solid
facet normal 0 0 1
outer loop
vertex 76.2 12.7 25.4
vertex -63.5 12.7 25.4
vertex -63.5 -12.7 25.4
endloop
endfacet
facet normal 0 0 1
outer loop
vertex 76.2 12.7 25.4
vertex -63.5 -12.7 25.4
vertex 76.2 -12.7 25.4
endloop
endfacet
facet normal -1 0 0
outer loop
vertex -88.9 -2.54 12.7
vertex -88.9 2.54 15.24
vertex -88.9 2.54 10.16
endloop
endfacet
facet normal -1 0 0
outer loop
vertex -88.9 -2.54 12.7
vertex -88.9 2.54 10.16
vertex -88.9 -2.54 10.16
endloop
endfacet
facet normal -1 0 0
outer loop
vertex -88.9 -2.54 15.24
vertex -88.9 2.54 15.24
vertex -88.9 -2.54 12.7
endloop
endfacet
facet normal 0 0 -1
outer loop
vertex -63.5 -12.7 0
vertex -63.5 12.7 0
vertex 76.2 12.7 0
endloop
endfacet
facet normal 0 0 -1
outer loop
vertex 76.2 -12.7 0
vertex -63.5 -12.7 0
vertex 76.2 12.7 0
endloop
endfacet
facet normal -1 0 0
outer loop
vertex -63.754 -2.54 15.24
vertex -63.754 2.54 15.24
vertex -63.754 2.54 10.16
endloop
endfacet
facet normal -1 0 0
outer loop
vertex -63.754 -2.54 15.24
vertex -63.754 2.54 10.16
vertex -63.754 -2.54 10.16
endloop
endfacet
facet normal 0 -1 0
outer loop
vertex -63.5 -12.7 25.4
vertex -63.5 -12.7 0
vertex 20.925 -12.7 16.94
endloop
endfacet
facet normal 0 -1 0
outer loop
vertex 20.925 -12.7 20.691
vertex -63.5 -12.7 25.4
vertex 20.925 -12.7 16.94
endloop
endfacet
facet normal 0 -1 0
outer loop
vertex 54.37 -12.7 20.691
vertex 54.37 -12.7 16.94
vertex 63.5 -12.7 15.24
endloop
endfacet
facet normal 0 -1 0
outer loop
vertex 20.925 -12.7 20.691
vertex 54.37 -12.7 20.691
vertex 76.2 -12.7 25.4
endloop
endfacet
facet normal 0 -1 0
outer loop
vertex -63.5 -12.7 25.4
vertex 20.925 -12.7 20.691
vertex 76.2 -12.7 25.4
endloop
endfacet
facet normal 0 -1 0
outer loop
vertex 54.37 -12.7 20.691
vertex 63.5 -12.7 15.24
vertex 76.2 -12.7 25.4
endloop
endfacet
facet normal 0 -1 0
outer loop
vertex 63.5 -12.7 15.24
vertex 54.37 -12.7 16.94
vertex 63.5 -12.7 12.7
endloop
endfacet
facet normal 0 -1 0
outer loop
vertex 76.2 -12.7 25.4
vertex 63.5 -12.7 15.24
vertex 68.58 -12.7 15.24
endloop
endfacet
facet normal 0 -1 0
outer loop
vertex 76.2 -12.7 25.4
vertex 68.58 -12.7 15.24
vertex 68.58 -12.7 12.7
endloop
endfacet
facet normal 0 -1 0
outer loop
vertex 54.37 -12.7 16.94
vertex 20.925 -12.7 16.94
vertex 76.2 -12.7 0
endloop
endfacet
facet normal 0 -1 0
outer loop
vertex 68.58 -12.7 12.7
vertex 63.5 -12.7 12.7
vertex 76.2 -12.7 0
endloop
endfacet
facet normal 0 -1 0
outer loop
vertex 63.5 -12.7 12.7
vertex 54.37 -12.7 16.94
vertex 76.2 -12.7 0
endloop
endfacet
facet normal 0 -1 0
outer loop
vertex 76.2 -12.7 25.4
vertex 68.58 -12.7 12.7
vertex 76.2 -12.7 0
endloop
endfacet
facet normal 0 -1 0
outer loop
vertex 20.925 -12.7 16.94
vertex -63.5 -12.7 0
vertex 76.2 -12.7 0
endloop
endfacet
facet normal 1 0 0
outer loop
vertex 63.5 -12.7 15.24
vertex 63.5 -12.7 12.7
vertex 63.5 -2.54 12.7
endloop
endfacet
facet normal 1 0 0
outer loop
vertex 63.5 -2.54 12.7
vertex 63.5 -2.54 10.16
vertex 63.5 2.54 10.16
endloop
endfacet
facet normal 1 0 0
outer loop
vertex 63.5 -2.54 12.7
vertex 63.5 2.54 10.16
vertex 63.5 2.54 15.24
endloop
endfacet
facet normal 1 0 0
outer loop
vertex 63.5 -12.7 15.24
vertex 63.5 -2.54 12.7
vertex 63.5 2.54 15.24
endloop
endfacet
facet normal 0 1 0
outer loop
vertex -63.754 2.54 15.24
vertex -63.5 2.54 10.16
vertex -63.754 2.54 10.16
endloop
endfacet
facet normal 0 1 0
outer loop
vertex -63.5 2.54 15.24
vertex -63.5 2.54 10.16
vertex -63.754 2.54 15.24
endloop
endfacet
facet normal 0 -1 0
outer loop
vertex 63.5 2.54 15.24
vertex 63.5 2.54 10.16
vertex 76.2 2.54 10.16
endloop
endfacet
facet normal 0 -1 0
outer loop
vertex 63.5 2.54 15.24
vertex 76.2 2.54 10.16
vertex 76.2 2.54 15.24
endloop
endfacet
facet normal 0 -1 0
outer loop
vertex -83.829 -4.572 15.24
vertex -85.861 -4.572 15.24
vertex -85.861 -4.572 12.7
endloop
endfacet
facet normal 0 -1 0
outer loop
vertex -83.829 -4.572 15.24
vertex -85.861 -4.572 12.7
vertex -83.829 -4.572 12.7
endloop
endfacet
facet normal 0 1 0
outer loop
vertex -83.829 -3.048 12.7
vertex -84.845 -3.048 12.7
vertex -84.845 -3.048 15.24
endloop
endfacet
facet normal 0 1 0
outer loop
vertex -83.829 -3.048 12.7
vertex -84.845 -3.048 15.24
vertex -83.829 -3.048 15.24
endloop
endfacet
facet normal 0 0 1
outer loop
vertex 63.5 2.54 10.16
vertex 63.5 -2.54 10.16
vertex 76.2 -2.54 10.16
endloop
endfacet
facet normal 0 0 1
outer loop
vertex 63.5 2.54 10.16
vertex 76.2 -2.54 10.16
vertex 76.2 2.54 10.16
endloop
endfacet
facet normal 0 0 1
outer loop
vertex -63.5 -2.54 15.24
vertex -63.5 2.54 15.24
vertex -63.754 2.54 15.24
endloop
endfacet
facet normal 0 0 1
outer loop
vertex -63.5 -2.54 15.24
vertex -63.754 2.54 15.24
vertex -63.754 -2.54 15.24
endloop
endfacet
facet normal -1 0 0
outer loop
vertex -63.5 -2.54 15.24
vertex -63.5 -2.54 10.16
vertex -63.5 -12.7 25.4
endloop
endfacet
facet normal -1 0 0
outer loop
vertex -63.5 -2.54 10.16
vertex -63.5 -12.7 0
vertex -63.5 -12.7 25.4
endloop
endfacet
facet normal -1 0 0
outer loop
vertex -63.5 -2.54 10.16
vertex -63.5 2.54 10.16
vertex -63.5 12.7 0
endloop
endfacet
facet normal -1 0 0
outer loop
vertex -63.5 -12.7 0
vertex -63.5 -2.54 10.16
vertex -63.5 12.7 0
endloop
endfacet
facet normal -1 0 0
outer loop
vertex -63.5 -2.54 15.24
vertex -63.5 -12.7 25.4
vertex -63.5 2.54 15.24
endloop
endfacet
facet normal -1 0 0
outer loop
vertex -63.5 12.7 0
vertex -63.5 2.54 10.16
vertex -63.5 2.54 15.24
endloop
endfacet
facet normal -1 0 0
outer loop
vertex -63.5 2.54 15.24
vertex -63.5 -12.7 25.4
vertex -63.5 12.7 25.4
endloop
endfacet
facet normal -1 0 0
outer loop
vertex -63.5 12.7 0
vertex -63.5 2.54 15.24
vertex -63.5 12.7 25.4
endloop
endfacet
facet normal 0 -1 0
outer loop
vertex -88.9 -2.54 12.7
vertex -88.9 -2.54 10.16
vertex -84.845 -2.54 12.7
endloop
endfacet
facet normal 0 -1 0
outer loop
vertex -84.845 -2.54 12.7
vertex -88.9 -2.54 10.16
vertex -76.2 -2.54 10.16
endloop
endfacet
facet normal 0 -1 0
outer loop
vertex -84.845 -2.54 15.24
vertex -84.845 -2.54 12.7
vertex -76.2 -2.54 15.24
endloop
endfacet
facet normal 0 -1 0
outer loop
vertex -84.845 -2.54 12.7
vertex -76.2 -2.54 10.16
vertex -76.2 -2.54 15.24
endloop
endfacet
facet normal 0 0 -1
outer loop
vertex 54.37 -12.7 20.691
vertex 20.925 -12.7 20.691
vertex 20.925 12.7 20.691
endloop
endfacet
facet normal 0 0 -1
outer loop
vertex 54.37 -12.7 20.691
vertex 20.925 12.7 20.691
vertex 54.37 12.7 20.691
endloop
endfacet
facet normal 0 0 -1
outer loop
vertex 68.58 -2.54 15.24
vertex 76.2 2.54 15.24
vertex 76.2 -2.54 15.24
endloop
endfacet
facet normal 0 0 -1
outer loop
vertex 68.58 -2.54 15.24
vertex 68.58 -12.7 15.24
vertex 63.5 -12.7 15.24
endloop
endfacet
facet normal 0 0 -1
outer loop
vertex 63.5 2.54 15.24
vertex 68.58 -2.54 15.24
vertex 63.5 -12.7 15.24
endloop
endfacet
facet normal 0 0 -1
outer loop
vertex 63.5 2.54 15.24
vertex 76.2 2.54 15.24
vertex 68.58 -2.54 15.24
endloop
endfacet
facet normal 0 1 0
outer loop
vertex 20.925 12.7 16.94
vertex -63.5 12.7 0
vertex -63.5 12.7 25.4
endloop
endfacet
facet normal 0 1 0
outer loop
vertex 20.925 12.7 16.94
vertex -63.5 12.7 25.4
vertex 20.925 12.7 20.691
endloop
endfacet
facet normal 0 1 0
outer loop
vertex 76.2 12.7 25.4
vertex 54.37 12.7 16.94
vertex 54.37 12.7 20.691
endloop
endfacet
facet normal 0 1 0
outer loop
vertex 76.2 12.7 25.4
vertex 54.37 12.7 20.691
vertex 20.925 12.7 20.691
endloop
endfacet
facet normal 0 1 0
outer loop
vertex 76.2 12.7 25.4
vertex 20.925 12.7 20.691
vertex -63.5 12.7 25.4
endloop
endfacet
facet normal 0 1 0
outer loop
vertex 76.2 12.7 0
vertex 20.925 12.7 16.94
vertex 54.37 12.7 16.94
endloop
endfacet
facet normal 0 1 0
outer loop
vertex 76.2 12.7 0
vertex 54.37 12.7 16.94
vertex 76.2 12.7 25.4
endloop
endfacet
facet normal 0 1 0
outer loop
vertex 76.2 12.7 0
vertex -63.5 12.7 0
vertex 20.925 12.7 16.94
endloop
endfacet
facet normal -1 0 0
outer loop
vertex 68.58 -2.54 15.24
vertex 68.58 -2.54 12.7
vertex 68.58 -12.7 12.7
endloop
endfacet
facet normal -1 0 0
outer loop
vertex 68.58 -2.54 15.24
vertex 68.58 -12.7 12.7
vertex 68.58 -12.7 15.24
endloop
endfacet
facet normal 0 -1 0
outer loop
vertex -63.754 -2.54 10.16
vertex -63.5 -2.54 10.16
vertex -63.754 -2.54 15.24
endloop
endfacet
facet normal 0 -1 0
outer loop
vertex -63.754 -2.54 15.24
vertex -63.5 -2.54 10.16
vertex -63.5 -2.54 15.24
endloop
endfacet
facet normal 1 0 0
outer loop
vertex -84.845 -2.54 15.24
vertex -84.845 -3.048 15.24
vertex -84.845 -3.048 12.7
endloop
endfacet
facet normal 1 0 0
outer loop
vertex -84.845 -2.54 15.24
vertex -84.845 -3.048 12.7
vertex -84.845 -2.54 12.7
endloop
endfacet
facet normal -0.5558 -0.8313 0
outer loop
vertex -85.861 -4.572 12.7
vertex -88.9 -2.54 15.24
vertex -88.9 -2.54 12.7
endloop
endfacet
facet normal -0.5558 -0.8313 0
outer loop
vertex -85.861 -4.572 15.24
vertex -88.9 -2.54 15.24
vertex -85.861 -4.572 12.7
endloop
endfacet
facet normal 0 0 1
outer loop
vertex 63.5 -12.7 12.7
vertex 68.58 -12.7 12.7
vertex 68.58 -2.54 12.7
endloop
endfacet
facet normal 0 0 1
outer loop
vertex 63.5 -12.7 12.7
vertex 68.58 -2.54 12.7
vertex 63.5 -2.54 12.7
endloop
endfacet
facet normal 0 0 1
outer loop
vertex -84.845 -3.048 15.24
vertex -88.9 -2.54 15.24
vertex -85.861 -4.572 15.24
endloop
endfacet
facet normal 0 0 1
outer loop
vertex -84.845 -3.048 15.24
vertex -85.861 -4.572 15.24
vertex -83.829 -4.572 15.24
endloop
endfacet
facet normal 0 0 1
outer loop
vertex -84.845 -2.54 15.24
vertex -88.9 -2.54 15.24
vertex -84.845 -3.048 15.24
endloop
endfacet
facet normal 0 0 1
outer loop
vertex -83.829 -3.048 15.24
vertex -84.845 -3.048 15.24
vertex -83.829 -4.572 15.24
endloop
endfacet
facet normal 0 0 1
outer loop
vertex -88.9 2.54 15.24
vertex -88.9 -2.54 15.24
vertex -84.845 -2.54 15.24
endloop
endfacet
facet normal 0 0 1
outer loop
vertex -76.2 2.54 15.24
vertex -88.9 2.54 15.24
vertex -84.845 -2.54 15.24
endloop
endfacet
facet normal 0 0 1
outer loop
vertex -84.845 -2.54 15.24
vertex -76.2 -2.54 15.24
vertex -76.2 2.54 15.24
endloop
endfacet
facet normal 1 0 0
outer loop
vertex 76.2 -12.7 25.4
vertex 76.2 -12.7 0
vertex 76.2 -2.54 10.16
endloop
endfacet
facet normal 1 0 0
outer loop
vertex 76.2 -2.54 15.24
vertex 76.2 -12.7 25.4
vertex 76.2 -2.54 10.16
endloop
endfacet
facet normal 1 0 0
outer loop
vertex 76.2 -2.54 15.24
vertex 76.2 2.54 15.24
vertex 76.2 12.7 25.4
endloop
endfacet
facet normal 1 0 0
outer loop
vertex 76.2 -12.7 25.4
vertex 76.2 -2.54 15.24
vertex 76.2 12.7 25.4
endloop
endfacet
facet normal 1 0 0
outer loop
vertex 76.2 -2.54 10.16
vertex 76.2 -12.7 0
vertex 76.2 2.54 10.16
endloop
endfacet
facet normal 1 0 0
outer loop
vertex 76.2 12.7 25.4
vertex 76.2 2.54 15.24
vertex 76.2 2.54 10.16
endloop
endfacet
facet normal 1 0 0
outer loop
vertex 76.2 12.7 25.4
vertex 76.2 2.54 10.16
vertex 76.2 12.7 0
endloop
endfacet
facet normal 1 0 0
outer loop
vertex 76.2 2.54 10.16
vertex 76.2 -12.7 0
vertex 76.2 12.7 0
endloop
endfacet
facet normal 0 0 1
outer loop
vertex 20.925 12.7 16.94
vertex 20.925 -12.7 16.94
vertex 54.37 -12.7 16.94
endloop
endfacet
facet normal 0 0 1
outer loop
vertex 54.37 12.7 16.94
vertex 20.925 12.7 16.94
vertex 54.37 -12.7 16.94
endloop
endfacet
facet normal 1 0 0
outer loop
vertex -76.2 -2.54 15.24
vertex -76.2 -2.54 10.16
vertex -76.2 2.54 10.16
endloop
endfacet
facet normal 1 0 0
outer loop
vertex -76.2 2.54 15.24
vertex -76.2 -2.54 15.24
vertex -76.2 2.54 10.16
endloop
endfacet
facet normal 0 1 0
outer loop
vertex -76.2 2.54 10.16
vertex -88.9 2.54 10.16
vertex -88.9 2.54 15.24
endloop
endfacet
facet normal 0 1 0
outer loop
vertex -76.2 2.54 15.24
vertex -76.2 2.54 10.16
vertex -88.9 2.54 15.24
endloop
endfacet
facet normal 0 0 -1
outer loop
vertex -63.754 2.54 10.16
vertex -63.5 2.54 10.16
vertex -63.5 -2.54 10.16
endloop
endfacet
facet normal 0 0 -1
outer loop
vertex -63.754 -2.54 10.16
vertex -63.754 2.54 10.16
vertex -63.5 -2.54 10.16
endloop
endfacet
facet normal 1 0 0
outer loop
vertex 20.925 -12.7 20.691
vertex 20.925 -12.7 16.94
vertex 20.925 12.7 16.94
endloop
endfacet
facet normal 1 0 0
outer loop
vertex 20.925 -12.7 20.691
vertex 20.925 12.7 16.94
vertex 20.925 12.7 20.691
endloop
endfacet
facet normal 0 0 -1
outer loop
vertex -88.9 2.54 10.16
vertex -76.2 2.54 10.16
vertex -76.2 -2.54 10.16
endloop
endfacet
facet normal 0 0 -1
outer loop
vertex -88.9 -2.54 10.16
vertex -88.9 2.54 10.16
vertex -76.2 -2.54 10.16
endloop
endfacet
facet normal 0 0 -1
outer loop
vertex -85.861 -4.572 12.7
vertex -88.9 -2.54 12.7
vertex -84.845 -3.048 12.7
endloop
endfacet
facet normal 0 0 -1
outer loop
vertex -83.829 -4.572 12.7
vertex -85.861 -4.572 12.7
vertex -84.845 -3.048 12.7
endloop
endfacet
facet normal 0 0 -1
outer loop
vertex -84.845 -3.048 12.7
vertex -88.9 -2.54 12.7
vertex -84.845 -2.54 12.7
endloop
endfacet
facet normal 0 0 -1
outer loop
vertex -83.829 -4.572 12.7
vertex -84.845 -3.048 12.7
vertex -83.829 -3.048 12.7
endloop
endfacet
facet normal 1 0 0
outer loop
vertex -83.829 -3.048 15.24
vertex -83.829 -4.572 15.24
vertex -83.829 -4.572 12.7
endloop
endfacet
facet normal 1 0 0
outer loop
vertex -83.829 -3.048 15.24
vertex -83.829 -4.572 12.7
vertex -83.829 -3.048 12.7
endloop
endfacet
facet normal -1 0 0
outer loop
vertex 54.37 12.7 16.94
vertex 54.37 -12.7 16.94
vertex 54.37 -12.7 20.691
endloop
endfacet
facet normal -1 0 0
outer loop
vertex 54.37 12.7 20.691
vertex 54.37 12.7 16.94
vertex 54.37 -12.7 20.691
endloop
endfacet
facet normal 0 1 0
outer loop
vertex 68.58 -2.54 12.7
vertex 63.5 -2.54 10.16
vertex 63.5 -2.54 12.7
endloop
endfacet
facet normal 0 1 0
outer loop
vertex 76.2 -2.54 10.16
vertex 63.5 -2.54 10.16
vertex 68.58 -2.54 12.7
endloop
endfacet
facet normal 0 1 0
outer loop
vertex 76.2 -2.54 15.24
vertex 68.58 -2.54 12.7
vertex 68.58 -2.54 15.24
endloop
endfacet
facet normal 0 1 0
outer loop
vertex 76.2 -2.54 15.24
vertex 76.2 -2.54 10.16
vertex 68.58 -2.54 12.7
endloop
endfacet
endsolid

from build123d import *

# Parameters (mm, degrees)
F0_W      = 152.4
F0_H      = 25.4
F1_DEPTH  = 25.4
F2_W      = 5.08
F2_H      = 5.08
F3_DEPTH  = 12.7
F5_W      = 5.08
F5_H      = 5.08
F6_DEPTH  = 12.7
F8_DEPTH  = 2.54
F9_W      = 1.016
F9_H      = 0.508
F10_DEPTH = 25.4
F4_W      = 5.08
F4_H      = 2.54
F11_DEPTH = 25.4
F12_W     = 33.4452539682
F12_H     = 3.7508700043
F13_DEPTH = 25.4
F14_W     = 12.7
F14_H     = 25.4
F15_DEPTH = 25.4
F16_W     = 5.08
F16_H     = 5.08
F17_DEPTH = 0.254


with BuildPart() as f1:
    # F0 (on Top) → F1 (new body)
    with BuildSketch(Plane.XY):
        Rectangle(F0_W, F0_H)
    extrude(amount=F1_DEPTH)

    # F2 (on face) → F3 (cut)
    with BuildSketch(Plane.YZ.offset(76.2)):
        with Locations((0, 12.7)):
            Rectangle(F2_W, F2_H)
    extrude(amount=-F3_DEPTH, mode=Mode.SUBTRACT)

    # F5 (on face) → F6 (join)
    with BuildSketch(Plane(origin=(-76.2, 0, 0), x_dir=(0, -1, 0), z_dir=(-1, 0, 0))):
        with Locations((0, 12.7)):
            Rectangle(F5_W, F5_H)
    extrude(amount=F6_DEPTH)

    # F7 (on face) → F8 (join)
    with BuildSketch(Plane.XY.offset(15.24)):
        Polygon((-83.8287068658, -2.54), (-88.9, -2.54), (-85.8607068658, -4.572), (-83.8287068658, -4.572), align=None)
    extrude(amount=-F8_DEPTH)

    # F9 (on face) → F10 (cut)
    with BuildSketch(Plane.XY.offset(15.24)):
        with Locations((-84.3367068658, -2.794)):
            Rectangle(F9_W, F9_H)
    extrude(amount=-F10_DEPTH, mode=Mode.SUBTRACT)

    # F4 (on face) → F11 (cut)
    with BuildSketch(Plane(origin=(0, -2.54, 0), x_dir=(-1, 0, 0), z_dir=(0, 1, 0))):
        with Locations((-66.04, 13.97)):
            Rectangle(F4_W, F4_H)
    extrude(amount=-F11_DEPTH, mode=Mode.SUBTRACT)

    # F12 (on face) → F13 (cut)
    with BuildSketch(Plane.XZ.offset(12.7)):
        with Locations((37.6476235688, 18.8155183569)):
            Rectangle(F12_W, F12_H)
    extrude(amount=-F13_DEPTH, mode=Mode.SUBTRACT)

    # F14 (on face) → F15 (cut)
    with BuildSketch(Plane.XY.offset(25.4)):
        with Locations((-69.85, 0)):
            Rectangle(F14_W, F14_H)
    extrude(amount=-F15_DEPTH, mode=Mode.SUBTRACT)

    # F16 (on face) → F17 (join)
    with BuildSketch(Plane(origin=(-63.5, 0, 0), x_dir=(0, -1, 0), z_dir=(-1, 0, 0))):
        with Locations((0, 12.7)):
            Rectangle(F16_W, F16_H)
    extrude(amount=F17_DEPTH)


solid = f1.part
